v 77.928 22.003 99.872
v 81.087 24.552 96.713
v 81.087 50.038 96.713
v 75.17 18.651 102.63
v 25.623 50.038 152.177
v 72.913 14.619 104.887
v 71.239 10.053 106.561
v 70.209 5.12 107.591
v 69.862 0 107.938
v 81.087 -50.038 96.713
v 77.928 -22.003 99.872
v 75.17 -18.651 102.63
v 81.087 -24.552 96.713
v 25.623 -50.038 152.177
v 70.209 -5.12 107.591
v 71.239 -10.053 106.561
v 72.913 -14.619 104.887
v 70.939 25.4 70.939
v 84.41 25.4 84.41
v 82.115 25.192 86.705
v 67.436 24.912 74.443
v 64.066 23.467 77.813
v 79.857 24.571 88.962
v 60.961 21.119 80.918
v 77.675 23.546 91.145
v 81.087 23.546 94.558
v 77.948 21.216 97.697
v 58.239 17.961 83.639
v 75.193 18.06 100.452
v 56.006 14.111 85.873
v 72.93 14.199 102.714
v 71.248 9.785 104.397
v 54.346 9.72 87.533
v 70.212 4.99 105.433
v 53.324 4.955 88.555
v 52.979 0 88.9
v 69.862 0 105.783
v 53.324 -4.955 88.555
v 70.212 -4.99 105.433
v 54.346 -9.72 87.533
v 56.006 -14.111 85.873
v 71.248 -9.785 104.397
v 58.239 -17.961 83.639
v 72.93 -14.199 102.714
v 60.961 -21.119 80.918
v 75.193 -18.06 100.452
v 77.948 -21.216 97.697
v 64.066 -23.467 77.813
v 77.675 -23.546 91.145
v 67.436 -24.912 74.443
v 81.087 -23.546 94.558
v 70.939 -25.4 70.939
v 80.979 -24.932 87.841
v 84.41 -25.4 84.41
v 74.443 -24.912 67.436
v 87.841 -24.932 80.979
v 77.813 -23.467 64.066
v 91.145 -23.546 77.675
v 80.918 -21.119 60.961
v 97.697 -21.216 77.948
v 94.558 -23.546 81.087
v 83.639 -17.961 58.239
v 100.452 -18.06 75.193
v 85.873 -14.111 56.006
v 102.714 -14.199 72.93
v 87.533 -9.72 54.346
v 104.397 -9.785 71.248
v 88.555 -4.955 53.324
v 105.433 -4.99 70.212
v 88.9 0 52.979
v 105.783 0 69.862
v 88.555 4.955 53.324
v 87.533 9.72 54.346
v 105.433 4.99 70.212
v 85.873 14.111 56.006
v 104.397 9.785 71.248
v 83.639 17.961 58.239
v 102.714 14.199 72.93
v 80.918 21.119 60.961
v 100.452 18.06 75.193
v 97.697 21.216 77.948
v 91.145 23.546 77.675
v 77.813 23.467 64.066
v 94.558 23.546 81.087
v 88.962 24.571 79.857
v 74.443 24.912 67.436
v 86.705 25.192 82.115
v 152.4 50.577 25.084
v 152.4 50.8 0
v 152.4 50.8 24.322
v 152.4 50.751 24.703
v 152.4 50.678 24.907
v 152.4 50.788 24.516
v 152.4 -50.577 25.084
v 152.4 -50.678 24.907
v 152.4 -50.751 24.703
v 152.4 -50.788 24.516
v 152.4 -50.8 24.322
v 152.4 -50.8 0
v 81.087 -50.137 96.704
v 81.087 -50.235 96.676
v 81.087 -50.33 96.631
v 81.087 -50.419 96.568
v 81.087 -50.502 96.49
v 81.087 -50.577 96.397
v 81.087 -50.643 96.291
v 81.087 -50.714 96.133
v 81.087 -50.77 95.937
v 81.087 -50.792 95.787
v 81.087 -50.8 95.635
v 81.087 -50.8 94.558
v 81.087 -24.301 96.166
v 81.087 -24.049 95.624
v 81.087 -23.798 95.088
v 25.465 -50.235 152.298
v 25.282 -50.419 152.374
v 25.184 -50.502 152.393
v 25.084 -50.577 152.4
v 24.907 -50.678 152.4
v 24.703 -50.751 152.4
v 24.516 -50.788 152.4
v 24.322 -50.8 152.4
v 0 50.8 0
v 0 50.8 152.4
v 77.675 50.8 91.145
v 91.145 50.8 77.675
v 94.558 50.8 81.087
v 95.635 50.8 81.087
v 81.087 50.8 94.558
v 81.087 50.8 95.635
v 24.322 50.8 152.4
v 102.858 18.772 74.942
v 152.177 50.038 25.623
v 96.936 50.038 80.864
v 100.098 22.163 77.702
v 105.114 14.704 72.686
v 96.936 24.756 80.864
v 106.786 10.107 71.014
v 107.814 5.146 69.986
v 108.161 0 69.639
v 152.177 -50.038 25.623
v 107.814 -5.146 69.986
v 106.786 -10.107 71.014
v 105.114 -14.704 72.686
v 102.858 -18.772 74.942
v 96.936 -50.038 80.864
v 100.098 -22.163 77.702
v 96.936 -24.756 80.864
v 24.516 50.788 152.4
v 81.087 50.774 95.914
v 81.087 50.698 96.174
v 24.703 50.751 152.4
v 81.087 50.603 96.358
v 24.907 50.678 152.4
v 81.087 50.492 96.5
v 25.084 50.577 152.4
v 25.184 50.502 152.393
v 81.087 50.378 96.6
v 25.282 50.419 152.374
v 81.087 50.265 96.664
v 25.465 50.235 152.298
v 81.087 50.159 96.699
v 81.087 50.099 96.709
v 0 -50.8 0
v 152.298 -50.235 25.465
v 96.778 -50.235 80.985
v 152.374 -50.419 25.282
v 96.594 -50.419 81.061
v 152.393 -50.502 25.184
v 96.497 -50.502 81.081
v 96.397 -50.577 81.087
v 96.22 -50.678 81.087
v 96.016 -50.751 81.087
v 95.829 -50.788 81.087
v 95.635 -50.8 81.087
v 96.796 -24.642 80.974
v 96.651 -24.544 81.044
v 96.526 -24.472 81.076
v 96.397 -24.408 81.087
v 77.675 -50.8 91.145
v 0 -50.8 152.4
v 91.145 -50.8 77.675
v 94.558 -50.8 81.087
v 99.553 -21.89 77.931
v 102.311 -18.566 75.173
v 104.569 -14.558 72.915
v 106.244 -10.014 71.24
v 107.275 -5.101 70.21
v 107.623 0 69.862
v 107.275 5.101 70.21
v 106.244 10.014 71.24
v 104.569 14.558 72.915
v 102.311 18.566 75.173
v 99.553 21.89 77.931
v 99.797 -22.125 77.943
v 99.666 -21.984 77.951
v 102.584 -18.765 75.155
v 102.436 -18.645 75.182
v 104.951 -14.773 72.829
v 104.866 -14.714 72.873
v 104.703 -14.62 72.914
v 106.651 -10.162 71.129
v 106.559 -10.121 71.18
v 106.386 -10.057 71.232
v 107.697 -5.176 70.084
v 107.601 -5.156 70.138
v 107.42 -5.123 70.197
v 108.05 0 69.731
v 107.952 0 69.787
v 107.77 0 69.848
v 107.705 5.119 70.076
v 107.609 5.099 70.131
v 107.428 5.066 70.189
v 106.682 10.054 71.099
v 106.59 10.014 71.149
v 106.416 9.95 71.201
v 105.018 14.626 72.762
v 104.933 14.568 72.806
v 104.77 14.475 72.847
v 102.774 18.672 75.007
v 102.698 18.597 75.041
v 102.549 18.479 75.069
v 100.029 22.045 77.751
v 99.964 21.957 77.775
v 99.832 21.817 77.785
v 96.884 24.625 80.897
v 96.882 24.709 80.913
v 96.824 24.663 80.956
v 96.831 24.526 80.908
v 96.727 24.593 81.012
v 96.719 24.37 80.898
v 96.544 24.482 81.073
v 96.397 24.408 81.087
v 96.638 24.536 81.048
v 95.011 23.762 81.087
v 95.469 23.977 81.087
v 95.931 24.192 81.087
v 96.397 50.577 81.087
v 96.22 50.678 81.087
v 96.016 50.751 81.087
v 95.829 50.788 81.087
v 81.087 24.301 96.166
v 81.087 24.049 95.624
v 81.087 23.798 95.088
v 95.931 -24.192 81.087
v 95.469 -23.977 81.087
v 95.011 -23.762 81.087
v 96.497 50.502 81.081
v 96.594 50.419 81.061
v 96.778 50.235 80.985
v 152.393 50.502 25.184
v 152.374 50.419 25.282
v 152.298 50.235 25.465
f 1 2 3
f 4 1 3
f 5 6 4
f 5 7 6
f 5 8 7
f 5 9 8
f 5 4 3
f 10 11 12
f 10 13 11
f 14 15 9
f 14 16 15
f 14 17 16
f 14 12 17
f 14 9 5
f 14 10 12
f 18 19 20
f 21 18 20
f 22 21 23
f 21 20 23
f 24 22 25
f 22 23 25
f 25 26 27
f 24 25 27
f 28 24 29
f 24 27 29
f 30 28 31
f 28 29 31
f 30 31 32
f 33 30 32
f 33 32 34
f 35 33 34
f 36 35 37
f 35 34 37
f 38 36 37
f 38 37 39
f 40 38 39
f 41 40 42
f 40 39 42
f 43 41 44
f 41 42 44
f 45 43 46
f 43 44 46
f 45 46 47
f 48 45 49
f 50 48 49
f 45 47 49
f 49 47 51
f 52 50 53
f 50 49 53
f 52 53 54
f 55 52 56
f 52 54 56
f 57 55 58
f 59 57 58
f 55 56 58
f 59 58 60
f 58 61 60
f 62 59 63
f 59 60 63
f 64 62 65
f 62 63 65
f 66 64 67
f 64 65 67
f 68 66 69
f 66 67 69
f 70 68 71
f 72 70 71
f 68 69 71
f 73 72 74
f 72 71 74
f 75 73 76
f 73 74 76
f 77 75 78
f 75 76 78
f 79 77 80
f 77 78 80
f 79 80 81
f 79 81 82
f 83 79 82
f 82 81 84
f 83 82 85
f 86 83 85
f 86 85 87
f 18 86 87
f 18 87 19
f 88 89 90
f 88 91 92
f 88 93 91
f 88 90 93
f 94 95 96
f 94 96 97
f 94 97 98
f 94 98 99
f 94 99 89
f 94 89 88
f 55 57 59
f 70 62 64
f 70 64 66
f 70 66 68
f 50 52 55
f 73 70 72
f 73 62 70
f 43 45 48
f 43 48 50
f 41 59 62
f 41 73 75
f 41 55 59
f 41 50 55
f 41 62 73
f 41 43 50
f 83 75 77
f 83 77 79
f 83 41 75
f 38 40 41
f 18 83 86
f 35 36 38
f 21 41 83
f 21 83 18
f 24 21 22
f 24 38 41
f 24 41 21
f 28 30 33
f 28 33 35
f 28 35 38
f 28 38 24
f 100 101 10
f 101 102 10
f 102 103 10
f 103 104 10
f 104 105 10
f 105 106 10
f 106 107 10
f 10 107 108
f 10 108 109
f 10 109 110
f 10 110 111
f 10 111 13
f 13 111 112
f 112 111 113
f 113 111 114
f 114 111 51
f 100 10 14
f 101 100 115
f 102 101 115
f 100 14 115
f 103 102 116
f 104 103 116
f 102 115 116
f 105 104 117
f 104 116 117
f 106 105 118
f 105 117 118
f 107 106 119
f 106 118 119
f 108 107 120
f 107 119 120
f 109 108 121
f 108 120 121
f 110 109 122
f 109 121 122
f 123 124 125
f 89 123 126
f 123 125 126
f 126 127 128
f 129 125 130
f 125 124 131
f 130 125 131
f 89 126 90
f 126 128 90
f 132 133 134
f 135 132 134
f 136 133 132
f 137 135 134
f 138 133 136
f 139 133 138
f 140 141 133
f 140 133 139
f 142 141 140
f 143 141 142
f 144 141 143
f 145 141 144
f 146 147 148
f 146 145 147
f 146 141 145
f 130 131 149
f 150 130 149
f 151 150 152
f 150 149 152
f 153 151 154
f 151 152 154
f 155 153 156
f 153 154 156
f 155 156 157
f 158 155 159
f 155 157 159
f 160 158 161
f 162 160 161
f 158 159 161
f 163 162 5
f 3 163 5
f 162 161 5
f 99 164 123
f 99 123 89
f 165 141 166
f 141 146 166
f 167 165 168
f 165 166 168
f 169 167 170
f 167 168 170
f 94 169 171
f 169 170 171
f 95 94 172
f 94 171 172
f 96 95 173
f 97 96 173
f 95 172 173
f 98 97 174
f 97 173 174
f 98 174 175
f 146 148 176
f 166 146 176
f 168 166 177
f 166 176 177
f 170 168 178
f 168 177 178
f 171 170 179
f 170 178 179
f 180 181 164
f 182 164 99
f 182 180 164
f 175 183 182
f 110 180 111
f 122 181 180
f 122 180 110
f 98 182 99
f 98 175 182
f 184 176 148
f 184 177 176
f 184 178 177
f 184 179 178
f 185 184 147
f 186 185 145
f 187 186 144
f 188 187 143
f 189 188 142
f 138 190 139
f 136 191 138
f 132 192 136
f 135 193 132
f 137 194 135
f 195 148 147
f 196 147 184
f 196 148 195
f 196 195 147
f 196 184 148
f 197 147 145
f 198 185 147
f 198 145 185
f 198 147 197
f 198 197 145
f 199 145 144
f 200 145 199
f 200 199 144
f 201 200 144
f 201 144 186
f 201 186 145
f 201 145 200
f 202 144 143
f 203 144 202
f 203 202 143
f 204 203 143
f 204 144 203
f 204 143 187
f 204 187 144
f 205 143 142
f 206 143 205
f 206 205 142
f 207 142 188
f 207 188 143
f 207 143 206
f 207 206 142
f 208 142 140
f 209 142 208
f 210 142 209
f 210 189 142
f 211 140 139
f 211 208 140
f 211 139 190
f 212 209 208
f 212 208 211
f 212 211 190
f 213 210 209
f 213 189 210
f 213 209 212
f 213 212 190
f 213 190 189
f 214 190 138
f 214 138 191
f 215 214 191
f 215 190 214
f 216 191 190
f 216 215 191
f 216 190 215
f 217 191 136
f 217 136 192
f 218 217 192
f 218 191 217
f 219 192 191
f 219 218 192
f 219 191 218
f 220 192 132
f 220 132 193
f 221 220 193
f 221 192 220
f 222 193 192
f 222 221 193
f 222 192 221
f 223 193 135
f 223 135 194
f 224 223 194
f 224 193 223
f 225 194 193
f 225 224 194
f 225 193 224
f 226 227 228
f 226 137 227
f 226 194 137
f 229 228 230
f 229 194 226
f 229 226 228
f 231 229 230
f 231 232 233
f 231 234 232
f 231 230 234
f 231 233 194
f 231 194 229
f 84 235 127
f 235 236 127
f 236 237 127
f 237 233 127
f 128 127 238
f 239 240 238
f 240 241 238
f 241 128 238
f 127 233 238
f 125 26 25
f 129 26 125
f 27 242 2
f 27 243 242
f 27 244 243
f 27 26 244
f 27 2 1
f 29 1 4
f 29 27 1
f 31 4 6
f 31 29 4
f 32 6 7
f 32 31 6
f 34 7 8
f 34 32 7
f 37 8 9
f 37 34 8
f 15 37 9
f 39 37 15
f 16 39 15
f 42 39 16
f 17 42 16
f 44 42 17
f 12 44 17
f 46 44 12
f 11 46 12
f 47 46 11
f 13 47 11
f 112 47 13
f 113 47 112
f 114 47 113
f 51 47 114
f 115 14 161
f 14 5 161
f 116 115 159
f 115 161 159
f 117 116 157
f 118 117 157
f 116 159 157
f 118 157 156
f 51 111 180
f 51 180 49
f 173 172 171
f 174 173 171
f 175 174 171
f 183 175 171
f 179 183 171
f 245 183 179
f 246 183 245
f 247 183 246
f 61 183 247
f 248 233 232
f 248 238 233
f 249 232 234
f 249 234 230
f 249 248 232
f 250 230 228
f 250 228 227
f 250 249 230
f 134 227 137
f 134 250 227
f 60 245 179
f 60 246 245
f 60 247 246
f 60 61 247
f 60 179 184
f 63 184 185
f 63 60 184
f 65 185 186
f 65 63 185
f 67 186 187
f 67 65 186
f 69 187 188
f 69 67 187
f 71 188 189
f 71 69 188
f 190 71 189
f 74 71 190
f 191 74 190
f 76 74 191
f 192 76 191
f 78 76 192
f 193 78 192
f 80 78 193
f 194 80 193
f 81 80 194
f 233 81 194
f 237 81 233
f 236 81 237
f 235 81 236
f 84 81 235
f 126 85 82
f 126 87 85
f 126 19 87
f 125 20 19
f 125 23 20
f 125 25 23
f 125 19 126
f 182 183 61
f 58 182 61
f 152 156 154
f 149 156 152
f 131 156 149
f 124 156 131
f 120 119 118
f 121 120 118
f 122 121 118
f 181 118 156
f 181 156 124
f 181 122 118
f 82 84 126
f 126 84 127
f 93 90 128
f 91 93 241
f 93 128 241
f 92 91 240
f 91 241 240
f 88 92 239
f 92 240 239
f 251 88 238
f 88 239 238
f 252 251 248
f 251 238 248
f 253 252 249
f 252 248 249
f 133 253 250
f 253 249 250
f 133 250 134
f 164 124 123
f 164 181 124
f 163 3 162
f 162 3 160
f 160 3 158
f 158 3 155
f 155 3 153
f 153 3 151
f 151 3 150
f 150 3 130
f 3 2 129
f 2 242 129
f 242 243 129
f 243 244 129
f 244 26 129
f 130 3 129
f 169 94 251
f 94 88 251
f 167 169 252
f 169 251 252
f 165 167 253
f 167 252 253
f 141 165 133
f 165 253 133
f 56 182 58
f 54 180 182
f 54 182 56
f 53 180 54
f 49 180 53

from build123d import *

# Parameters (mm, degrees)
F1_DEPTH      = 50.8
F1_DEPTH_BACK = 50.8
F2_R          = 25.4
F3_DEPTH      = 25.4
F4_W          = 110.558038988
F4_H          = 19.05
F5_DEPTH      = 6.35
F6_SIZE       = 1.524
F7_R          = 0.762


with BuildPart() as f1:
    # F0 (on Front) → F1 (new body, two sides)
    with BuildSketch(Plane.XZ) as f1_sk:
        Polygon((0, 152.4), (0, 0), (152.4, 0), (152.4, 25.4), (25.4, 152.4), align=None)
    extrude(amount=F1_DEPTH)
    extrude(f1_sk.sketch, amount=-F1_DEPTH_BACK)

    # F2 (on face) → F3 (cut)
    with BuildSketch(Plane(origin=(88.9, 0, 88.9), x_dir=(0, 1, 0), z_dir=(0.7071067812, 0, 0.7071067812))):
        Circle(F2_R)
    extrude(amount=-F3_DEPTH, mode=Mode.SUBTRACT)

    # F4 (on face) → F5 (cut)
    with BuildSketch(Plane(origin=(88.9, 0, 88.9), x_dir=(0, 1, 0), z_dir=(0.7071067812, 0, 0.7071067812))):
        Rectangle(F4_W, F4_H)
    extrude(amount=-F5_DEPTH, mode=Mode.SUBTRACT)

    # F6
    f6_edges = [f1.edges().sort_by_distance(p)[0] for p in [
        (82.164808, -37.173215, 95.635192),
        (95.635192, -37.173215, 82.164808),
        (95.635192, 37.173215, 82.164808),
        (82.164808, 37.173215, 95.635192),
        (70.939488, 0, 106.860512),
        (106.860512, 0, 70.939488),
    ]]
    chamfer(f6_edges, length=F6_SIZE)

    # F7
    f7_edges = [f1.edges().sort_by_distance(p)[0] for p in [
        (25.4, 0, 152.4),
        (53.243589, -50.8, 124.556411),
        (53.243589, 50.8, 124.556411),
        (124.556411, 50.8, 53.243589),
        (96.712823, 37.67621, 81.087177),
        (152.4, 0, 25.4),
        (107.938143, 0, 69.861857),
        (124.556411, -50.8, 53.243589),
        (96.712823, -37.67621, 81.087177),
    ]]
    fillet(f7_edges, radius=F7_R)


solid = f1.part
